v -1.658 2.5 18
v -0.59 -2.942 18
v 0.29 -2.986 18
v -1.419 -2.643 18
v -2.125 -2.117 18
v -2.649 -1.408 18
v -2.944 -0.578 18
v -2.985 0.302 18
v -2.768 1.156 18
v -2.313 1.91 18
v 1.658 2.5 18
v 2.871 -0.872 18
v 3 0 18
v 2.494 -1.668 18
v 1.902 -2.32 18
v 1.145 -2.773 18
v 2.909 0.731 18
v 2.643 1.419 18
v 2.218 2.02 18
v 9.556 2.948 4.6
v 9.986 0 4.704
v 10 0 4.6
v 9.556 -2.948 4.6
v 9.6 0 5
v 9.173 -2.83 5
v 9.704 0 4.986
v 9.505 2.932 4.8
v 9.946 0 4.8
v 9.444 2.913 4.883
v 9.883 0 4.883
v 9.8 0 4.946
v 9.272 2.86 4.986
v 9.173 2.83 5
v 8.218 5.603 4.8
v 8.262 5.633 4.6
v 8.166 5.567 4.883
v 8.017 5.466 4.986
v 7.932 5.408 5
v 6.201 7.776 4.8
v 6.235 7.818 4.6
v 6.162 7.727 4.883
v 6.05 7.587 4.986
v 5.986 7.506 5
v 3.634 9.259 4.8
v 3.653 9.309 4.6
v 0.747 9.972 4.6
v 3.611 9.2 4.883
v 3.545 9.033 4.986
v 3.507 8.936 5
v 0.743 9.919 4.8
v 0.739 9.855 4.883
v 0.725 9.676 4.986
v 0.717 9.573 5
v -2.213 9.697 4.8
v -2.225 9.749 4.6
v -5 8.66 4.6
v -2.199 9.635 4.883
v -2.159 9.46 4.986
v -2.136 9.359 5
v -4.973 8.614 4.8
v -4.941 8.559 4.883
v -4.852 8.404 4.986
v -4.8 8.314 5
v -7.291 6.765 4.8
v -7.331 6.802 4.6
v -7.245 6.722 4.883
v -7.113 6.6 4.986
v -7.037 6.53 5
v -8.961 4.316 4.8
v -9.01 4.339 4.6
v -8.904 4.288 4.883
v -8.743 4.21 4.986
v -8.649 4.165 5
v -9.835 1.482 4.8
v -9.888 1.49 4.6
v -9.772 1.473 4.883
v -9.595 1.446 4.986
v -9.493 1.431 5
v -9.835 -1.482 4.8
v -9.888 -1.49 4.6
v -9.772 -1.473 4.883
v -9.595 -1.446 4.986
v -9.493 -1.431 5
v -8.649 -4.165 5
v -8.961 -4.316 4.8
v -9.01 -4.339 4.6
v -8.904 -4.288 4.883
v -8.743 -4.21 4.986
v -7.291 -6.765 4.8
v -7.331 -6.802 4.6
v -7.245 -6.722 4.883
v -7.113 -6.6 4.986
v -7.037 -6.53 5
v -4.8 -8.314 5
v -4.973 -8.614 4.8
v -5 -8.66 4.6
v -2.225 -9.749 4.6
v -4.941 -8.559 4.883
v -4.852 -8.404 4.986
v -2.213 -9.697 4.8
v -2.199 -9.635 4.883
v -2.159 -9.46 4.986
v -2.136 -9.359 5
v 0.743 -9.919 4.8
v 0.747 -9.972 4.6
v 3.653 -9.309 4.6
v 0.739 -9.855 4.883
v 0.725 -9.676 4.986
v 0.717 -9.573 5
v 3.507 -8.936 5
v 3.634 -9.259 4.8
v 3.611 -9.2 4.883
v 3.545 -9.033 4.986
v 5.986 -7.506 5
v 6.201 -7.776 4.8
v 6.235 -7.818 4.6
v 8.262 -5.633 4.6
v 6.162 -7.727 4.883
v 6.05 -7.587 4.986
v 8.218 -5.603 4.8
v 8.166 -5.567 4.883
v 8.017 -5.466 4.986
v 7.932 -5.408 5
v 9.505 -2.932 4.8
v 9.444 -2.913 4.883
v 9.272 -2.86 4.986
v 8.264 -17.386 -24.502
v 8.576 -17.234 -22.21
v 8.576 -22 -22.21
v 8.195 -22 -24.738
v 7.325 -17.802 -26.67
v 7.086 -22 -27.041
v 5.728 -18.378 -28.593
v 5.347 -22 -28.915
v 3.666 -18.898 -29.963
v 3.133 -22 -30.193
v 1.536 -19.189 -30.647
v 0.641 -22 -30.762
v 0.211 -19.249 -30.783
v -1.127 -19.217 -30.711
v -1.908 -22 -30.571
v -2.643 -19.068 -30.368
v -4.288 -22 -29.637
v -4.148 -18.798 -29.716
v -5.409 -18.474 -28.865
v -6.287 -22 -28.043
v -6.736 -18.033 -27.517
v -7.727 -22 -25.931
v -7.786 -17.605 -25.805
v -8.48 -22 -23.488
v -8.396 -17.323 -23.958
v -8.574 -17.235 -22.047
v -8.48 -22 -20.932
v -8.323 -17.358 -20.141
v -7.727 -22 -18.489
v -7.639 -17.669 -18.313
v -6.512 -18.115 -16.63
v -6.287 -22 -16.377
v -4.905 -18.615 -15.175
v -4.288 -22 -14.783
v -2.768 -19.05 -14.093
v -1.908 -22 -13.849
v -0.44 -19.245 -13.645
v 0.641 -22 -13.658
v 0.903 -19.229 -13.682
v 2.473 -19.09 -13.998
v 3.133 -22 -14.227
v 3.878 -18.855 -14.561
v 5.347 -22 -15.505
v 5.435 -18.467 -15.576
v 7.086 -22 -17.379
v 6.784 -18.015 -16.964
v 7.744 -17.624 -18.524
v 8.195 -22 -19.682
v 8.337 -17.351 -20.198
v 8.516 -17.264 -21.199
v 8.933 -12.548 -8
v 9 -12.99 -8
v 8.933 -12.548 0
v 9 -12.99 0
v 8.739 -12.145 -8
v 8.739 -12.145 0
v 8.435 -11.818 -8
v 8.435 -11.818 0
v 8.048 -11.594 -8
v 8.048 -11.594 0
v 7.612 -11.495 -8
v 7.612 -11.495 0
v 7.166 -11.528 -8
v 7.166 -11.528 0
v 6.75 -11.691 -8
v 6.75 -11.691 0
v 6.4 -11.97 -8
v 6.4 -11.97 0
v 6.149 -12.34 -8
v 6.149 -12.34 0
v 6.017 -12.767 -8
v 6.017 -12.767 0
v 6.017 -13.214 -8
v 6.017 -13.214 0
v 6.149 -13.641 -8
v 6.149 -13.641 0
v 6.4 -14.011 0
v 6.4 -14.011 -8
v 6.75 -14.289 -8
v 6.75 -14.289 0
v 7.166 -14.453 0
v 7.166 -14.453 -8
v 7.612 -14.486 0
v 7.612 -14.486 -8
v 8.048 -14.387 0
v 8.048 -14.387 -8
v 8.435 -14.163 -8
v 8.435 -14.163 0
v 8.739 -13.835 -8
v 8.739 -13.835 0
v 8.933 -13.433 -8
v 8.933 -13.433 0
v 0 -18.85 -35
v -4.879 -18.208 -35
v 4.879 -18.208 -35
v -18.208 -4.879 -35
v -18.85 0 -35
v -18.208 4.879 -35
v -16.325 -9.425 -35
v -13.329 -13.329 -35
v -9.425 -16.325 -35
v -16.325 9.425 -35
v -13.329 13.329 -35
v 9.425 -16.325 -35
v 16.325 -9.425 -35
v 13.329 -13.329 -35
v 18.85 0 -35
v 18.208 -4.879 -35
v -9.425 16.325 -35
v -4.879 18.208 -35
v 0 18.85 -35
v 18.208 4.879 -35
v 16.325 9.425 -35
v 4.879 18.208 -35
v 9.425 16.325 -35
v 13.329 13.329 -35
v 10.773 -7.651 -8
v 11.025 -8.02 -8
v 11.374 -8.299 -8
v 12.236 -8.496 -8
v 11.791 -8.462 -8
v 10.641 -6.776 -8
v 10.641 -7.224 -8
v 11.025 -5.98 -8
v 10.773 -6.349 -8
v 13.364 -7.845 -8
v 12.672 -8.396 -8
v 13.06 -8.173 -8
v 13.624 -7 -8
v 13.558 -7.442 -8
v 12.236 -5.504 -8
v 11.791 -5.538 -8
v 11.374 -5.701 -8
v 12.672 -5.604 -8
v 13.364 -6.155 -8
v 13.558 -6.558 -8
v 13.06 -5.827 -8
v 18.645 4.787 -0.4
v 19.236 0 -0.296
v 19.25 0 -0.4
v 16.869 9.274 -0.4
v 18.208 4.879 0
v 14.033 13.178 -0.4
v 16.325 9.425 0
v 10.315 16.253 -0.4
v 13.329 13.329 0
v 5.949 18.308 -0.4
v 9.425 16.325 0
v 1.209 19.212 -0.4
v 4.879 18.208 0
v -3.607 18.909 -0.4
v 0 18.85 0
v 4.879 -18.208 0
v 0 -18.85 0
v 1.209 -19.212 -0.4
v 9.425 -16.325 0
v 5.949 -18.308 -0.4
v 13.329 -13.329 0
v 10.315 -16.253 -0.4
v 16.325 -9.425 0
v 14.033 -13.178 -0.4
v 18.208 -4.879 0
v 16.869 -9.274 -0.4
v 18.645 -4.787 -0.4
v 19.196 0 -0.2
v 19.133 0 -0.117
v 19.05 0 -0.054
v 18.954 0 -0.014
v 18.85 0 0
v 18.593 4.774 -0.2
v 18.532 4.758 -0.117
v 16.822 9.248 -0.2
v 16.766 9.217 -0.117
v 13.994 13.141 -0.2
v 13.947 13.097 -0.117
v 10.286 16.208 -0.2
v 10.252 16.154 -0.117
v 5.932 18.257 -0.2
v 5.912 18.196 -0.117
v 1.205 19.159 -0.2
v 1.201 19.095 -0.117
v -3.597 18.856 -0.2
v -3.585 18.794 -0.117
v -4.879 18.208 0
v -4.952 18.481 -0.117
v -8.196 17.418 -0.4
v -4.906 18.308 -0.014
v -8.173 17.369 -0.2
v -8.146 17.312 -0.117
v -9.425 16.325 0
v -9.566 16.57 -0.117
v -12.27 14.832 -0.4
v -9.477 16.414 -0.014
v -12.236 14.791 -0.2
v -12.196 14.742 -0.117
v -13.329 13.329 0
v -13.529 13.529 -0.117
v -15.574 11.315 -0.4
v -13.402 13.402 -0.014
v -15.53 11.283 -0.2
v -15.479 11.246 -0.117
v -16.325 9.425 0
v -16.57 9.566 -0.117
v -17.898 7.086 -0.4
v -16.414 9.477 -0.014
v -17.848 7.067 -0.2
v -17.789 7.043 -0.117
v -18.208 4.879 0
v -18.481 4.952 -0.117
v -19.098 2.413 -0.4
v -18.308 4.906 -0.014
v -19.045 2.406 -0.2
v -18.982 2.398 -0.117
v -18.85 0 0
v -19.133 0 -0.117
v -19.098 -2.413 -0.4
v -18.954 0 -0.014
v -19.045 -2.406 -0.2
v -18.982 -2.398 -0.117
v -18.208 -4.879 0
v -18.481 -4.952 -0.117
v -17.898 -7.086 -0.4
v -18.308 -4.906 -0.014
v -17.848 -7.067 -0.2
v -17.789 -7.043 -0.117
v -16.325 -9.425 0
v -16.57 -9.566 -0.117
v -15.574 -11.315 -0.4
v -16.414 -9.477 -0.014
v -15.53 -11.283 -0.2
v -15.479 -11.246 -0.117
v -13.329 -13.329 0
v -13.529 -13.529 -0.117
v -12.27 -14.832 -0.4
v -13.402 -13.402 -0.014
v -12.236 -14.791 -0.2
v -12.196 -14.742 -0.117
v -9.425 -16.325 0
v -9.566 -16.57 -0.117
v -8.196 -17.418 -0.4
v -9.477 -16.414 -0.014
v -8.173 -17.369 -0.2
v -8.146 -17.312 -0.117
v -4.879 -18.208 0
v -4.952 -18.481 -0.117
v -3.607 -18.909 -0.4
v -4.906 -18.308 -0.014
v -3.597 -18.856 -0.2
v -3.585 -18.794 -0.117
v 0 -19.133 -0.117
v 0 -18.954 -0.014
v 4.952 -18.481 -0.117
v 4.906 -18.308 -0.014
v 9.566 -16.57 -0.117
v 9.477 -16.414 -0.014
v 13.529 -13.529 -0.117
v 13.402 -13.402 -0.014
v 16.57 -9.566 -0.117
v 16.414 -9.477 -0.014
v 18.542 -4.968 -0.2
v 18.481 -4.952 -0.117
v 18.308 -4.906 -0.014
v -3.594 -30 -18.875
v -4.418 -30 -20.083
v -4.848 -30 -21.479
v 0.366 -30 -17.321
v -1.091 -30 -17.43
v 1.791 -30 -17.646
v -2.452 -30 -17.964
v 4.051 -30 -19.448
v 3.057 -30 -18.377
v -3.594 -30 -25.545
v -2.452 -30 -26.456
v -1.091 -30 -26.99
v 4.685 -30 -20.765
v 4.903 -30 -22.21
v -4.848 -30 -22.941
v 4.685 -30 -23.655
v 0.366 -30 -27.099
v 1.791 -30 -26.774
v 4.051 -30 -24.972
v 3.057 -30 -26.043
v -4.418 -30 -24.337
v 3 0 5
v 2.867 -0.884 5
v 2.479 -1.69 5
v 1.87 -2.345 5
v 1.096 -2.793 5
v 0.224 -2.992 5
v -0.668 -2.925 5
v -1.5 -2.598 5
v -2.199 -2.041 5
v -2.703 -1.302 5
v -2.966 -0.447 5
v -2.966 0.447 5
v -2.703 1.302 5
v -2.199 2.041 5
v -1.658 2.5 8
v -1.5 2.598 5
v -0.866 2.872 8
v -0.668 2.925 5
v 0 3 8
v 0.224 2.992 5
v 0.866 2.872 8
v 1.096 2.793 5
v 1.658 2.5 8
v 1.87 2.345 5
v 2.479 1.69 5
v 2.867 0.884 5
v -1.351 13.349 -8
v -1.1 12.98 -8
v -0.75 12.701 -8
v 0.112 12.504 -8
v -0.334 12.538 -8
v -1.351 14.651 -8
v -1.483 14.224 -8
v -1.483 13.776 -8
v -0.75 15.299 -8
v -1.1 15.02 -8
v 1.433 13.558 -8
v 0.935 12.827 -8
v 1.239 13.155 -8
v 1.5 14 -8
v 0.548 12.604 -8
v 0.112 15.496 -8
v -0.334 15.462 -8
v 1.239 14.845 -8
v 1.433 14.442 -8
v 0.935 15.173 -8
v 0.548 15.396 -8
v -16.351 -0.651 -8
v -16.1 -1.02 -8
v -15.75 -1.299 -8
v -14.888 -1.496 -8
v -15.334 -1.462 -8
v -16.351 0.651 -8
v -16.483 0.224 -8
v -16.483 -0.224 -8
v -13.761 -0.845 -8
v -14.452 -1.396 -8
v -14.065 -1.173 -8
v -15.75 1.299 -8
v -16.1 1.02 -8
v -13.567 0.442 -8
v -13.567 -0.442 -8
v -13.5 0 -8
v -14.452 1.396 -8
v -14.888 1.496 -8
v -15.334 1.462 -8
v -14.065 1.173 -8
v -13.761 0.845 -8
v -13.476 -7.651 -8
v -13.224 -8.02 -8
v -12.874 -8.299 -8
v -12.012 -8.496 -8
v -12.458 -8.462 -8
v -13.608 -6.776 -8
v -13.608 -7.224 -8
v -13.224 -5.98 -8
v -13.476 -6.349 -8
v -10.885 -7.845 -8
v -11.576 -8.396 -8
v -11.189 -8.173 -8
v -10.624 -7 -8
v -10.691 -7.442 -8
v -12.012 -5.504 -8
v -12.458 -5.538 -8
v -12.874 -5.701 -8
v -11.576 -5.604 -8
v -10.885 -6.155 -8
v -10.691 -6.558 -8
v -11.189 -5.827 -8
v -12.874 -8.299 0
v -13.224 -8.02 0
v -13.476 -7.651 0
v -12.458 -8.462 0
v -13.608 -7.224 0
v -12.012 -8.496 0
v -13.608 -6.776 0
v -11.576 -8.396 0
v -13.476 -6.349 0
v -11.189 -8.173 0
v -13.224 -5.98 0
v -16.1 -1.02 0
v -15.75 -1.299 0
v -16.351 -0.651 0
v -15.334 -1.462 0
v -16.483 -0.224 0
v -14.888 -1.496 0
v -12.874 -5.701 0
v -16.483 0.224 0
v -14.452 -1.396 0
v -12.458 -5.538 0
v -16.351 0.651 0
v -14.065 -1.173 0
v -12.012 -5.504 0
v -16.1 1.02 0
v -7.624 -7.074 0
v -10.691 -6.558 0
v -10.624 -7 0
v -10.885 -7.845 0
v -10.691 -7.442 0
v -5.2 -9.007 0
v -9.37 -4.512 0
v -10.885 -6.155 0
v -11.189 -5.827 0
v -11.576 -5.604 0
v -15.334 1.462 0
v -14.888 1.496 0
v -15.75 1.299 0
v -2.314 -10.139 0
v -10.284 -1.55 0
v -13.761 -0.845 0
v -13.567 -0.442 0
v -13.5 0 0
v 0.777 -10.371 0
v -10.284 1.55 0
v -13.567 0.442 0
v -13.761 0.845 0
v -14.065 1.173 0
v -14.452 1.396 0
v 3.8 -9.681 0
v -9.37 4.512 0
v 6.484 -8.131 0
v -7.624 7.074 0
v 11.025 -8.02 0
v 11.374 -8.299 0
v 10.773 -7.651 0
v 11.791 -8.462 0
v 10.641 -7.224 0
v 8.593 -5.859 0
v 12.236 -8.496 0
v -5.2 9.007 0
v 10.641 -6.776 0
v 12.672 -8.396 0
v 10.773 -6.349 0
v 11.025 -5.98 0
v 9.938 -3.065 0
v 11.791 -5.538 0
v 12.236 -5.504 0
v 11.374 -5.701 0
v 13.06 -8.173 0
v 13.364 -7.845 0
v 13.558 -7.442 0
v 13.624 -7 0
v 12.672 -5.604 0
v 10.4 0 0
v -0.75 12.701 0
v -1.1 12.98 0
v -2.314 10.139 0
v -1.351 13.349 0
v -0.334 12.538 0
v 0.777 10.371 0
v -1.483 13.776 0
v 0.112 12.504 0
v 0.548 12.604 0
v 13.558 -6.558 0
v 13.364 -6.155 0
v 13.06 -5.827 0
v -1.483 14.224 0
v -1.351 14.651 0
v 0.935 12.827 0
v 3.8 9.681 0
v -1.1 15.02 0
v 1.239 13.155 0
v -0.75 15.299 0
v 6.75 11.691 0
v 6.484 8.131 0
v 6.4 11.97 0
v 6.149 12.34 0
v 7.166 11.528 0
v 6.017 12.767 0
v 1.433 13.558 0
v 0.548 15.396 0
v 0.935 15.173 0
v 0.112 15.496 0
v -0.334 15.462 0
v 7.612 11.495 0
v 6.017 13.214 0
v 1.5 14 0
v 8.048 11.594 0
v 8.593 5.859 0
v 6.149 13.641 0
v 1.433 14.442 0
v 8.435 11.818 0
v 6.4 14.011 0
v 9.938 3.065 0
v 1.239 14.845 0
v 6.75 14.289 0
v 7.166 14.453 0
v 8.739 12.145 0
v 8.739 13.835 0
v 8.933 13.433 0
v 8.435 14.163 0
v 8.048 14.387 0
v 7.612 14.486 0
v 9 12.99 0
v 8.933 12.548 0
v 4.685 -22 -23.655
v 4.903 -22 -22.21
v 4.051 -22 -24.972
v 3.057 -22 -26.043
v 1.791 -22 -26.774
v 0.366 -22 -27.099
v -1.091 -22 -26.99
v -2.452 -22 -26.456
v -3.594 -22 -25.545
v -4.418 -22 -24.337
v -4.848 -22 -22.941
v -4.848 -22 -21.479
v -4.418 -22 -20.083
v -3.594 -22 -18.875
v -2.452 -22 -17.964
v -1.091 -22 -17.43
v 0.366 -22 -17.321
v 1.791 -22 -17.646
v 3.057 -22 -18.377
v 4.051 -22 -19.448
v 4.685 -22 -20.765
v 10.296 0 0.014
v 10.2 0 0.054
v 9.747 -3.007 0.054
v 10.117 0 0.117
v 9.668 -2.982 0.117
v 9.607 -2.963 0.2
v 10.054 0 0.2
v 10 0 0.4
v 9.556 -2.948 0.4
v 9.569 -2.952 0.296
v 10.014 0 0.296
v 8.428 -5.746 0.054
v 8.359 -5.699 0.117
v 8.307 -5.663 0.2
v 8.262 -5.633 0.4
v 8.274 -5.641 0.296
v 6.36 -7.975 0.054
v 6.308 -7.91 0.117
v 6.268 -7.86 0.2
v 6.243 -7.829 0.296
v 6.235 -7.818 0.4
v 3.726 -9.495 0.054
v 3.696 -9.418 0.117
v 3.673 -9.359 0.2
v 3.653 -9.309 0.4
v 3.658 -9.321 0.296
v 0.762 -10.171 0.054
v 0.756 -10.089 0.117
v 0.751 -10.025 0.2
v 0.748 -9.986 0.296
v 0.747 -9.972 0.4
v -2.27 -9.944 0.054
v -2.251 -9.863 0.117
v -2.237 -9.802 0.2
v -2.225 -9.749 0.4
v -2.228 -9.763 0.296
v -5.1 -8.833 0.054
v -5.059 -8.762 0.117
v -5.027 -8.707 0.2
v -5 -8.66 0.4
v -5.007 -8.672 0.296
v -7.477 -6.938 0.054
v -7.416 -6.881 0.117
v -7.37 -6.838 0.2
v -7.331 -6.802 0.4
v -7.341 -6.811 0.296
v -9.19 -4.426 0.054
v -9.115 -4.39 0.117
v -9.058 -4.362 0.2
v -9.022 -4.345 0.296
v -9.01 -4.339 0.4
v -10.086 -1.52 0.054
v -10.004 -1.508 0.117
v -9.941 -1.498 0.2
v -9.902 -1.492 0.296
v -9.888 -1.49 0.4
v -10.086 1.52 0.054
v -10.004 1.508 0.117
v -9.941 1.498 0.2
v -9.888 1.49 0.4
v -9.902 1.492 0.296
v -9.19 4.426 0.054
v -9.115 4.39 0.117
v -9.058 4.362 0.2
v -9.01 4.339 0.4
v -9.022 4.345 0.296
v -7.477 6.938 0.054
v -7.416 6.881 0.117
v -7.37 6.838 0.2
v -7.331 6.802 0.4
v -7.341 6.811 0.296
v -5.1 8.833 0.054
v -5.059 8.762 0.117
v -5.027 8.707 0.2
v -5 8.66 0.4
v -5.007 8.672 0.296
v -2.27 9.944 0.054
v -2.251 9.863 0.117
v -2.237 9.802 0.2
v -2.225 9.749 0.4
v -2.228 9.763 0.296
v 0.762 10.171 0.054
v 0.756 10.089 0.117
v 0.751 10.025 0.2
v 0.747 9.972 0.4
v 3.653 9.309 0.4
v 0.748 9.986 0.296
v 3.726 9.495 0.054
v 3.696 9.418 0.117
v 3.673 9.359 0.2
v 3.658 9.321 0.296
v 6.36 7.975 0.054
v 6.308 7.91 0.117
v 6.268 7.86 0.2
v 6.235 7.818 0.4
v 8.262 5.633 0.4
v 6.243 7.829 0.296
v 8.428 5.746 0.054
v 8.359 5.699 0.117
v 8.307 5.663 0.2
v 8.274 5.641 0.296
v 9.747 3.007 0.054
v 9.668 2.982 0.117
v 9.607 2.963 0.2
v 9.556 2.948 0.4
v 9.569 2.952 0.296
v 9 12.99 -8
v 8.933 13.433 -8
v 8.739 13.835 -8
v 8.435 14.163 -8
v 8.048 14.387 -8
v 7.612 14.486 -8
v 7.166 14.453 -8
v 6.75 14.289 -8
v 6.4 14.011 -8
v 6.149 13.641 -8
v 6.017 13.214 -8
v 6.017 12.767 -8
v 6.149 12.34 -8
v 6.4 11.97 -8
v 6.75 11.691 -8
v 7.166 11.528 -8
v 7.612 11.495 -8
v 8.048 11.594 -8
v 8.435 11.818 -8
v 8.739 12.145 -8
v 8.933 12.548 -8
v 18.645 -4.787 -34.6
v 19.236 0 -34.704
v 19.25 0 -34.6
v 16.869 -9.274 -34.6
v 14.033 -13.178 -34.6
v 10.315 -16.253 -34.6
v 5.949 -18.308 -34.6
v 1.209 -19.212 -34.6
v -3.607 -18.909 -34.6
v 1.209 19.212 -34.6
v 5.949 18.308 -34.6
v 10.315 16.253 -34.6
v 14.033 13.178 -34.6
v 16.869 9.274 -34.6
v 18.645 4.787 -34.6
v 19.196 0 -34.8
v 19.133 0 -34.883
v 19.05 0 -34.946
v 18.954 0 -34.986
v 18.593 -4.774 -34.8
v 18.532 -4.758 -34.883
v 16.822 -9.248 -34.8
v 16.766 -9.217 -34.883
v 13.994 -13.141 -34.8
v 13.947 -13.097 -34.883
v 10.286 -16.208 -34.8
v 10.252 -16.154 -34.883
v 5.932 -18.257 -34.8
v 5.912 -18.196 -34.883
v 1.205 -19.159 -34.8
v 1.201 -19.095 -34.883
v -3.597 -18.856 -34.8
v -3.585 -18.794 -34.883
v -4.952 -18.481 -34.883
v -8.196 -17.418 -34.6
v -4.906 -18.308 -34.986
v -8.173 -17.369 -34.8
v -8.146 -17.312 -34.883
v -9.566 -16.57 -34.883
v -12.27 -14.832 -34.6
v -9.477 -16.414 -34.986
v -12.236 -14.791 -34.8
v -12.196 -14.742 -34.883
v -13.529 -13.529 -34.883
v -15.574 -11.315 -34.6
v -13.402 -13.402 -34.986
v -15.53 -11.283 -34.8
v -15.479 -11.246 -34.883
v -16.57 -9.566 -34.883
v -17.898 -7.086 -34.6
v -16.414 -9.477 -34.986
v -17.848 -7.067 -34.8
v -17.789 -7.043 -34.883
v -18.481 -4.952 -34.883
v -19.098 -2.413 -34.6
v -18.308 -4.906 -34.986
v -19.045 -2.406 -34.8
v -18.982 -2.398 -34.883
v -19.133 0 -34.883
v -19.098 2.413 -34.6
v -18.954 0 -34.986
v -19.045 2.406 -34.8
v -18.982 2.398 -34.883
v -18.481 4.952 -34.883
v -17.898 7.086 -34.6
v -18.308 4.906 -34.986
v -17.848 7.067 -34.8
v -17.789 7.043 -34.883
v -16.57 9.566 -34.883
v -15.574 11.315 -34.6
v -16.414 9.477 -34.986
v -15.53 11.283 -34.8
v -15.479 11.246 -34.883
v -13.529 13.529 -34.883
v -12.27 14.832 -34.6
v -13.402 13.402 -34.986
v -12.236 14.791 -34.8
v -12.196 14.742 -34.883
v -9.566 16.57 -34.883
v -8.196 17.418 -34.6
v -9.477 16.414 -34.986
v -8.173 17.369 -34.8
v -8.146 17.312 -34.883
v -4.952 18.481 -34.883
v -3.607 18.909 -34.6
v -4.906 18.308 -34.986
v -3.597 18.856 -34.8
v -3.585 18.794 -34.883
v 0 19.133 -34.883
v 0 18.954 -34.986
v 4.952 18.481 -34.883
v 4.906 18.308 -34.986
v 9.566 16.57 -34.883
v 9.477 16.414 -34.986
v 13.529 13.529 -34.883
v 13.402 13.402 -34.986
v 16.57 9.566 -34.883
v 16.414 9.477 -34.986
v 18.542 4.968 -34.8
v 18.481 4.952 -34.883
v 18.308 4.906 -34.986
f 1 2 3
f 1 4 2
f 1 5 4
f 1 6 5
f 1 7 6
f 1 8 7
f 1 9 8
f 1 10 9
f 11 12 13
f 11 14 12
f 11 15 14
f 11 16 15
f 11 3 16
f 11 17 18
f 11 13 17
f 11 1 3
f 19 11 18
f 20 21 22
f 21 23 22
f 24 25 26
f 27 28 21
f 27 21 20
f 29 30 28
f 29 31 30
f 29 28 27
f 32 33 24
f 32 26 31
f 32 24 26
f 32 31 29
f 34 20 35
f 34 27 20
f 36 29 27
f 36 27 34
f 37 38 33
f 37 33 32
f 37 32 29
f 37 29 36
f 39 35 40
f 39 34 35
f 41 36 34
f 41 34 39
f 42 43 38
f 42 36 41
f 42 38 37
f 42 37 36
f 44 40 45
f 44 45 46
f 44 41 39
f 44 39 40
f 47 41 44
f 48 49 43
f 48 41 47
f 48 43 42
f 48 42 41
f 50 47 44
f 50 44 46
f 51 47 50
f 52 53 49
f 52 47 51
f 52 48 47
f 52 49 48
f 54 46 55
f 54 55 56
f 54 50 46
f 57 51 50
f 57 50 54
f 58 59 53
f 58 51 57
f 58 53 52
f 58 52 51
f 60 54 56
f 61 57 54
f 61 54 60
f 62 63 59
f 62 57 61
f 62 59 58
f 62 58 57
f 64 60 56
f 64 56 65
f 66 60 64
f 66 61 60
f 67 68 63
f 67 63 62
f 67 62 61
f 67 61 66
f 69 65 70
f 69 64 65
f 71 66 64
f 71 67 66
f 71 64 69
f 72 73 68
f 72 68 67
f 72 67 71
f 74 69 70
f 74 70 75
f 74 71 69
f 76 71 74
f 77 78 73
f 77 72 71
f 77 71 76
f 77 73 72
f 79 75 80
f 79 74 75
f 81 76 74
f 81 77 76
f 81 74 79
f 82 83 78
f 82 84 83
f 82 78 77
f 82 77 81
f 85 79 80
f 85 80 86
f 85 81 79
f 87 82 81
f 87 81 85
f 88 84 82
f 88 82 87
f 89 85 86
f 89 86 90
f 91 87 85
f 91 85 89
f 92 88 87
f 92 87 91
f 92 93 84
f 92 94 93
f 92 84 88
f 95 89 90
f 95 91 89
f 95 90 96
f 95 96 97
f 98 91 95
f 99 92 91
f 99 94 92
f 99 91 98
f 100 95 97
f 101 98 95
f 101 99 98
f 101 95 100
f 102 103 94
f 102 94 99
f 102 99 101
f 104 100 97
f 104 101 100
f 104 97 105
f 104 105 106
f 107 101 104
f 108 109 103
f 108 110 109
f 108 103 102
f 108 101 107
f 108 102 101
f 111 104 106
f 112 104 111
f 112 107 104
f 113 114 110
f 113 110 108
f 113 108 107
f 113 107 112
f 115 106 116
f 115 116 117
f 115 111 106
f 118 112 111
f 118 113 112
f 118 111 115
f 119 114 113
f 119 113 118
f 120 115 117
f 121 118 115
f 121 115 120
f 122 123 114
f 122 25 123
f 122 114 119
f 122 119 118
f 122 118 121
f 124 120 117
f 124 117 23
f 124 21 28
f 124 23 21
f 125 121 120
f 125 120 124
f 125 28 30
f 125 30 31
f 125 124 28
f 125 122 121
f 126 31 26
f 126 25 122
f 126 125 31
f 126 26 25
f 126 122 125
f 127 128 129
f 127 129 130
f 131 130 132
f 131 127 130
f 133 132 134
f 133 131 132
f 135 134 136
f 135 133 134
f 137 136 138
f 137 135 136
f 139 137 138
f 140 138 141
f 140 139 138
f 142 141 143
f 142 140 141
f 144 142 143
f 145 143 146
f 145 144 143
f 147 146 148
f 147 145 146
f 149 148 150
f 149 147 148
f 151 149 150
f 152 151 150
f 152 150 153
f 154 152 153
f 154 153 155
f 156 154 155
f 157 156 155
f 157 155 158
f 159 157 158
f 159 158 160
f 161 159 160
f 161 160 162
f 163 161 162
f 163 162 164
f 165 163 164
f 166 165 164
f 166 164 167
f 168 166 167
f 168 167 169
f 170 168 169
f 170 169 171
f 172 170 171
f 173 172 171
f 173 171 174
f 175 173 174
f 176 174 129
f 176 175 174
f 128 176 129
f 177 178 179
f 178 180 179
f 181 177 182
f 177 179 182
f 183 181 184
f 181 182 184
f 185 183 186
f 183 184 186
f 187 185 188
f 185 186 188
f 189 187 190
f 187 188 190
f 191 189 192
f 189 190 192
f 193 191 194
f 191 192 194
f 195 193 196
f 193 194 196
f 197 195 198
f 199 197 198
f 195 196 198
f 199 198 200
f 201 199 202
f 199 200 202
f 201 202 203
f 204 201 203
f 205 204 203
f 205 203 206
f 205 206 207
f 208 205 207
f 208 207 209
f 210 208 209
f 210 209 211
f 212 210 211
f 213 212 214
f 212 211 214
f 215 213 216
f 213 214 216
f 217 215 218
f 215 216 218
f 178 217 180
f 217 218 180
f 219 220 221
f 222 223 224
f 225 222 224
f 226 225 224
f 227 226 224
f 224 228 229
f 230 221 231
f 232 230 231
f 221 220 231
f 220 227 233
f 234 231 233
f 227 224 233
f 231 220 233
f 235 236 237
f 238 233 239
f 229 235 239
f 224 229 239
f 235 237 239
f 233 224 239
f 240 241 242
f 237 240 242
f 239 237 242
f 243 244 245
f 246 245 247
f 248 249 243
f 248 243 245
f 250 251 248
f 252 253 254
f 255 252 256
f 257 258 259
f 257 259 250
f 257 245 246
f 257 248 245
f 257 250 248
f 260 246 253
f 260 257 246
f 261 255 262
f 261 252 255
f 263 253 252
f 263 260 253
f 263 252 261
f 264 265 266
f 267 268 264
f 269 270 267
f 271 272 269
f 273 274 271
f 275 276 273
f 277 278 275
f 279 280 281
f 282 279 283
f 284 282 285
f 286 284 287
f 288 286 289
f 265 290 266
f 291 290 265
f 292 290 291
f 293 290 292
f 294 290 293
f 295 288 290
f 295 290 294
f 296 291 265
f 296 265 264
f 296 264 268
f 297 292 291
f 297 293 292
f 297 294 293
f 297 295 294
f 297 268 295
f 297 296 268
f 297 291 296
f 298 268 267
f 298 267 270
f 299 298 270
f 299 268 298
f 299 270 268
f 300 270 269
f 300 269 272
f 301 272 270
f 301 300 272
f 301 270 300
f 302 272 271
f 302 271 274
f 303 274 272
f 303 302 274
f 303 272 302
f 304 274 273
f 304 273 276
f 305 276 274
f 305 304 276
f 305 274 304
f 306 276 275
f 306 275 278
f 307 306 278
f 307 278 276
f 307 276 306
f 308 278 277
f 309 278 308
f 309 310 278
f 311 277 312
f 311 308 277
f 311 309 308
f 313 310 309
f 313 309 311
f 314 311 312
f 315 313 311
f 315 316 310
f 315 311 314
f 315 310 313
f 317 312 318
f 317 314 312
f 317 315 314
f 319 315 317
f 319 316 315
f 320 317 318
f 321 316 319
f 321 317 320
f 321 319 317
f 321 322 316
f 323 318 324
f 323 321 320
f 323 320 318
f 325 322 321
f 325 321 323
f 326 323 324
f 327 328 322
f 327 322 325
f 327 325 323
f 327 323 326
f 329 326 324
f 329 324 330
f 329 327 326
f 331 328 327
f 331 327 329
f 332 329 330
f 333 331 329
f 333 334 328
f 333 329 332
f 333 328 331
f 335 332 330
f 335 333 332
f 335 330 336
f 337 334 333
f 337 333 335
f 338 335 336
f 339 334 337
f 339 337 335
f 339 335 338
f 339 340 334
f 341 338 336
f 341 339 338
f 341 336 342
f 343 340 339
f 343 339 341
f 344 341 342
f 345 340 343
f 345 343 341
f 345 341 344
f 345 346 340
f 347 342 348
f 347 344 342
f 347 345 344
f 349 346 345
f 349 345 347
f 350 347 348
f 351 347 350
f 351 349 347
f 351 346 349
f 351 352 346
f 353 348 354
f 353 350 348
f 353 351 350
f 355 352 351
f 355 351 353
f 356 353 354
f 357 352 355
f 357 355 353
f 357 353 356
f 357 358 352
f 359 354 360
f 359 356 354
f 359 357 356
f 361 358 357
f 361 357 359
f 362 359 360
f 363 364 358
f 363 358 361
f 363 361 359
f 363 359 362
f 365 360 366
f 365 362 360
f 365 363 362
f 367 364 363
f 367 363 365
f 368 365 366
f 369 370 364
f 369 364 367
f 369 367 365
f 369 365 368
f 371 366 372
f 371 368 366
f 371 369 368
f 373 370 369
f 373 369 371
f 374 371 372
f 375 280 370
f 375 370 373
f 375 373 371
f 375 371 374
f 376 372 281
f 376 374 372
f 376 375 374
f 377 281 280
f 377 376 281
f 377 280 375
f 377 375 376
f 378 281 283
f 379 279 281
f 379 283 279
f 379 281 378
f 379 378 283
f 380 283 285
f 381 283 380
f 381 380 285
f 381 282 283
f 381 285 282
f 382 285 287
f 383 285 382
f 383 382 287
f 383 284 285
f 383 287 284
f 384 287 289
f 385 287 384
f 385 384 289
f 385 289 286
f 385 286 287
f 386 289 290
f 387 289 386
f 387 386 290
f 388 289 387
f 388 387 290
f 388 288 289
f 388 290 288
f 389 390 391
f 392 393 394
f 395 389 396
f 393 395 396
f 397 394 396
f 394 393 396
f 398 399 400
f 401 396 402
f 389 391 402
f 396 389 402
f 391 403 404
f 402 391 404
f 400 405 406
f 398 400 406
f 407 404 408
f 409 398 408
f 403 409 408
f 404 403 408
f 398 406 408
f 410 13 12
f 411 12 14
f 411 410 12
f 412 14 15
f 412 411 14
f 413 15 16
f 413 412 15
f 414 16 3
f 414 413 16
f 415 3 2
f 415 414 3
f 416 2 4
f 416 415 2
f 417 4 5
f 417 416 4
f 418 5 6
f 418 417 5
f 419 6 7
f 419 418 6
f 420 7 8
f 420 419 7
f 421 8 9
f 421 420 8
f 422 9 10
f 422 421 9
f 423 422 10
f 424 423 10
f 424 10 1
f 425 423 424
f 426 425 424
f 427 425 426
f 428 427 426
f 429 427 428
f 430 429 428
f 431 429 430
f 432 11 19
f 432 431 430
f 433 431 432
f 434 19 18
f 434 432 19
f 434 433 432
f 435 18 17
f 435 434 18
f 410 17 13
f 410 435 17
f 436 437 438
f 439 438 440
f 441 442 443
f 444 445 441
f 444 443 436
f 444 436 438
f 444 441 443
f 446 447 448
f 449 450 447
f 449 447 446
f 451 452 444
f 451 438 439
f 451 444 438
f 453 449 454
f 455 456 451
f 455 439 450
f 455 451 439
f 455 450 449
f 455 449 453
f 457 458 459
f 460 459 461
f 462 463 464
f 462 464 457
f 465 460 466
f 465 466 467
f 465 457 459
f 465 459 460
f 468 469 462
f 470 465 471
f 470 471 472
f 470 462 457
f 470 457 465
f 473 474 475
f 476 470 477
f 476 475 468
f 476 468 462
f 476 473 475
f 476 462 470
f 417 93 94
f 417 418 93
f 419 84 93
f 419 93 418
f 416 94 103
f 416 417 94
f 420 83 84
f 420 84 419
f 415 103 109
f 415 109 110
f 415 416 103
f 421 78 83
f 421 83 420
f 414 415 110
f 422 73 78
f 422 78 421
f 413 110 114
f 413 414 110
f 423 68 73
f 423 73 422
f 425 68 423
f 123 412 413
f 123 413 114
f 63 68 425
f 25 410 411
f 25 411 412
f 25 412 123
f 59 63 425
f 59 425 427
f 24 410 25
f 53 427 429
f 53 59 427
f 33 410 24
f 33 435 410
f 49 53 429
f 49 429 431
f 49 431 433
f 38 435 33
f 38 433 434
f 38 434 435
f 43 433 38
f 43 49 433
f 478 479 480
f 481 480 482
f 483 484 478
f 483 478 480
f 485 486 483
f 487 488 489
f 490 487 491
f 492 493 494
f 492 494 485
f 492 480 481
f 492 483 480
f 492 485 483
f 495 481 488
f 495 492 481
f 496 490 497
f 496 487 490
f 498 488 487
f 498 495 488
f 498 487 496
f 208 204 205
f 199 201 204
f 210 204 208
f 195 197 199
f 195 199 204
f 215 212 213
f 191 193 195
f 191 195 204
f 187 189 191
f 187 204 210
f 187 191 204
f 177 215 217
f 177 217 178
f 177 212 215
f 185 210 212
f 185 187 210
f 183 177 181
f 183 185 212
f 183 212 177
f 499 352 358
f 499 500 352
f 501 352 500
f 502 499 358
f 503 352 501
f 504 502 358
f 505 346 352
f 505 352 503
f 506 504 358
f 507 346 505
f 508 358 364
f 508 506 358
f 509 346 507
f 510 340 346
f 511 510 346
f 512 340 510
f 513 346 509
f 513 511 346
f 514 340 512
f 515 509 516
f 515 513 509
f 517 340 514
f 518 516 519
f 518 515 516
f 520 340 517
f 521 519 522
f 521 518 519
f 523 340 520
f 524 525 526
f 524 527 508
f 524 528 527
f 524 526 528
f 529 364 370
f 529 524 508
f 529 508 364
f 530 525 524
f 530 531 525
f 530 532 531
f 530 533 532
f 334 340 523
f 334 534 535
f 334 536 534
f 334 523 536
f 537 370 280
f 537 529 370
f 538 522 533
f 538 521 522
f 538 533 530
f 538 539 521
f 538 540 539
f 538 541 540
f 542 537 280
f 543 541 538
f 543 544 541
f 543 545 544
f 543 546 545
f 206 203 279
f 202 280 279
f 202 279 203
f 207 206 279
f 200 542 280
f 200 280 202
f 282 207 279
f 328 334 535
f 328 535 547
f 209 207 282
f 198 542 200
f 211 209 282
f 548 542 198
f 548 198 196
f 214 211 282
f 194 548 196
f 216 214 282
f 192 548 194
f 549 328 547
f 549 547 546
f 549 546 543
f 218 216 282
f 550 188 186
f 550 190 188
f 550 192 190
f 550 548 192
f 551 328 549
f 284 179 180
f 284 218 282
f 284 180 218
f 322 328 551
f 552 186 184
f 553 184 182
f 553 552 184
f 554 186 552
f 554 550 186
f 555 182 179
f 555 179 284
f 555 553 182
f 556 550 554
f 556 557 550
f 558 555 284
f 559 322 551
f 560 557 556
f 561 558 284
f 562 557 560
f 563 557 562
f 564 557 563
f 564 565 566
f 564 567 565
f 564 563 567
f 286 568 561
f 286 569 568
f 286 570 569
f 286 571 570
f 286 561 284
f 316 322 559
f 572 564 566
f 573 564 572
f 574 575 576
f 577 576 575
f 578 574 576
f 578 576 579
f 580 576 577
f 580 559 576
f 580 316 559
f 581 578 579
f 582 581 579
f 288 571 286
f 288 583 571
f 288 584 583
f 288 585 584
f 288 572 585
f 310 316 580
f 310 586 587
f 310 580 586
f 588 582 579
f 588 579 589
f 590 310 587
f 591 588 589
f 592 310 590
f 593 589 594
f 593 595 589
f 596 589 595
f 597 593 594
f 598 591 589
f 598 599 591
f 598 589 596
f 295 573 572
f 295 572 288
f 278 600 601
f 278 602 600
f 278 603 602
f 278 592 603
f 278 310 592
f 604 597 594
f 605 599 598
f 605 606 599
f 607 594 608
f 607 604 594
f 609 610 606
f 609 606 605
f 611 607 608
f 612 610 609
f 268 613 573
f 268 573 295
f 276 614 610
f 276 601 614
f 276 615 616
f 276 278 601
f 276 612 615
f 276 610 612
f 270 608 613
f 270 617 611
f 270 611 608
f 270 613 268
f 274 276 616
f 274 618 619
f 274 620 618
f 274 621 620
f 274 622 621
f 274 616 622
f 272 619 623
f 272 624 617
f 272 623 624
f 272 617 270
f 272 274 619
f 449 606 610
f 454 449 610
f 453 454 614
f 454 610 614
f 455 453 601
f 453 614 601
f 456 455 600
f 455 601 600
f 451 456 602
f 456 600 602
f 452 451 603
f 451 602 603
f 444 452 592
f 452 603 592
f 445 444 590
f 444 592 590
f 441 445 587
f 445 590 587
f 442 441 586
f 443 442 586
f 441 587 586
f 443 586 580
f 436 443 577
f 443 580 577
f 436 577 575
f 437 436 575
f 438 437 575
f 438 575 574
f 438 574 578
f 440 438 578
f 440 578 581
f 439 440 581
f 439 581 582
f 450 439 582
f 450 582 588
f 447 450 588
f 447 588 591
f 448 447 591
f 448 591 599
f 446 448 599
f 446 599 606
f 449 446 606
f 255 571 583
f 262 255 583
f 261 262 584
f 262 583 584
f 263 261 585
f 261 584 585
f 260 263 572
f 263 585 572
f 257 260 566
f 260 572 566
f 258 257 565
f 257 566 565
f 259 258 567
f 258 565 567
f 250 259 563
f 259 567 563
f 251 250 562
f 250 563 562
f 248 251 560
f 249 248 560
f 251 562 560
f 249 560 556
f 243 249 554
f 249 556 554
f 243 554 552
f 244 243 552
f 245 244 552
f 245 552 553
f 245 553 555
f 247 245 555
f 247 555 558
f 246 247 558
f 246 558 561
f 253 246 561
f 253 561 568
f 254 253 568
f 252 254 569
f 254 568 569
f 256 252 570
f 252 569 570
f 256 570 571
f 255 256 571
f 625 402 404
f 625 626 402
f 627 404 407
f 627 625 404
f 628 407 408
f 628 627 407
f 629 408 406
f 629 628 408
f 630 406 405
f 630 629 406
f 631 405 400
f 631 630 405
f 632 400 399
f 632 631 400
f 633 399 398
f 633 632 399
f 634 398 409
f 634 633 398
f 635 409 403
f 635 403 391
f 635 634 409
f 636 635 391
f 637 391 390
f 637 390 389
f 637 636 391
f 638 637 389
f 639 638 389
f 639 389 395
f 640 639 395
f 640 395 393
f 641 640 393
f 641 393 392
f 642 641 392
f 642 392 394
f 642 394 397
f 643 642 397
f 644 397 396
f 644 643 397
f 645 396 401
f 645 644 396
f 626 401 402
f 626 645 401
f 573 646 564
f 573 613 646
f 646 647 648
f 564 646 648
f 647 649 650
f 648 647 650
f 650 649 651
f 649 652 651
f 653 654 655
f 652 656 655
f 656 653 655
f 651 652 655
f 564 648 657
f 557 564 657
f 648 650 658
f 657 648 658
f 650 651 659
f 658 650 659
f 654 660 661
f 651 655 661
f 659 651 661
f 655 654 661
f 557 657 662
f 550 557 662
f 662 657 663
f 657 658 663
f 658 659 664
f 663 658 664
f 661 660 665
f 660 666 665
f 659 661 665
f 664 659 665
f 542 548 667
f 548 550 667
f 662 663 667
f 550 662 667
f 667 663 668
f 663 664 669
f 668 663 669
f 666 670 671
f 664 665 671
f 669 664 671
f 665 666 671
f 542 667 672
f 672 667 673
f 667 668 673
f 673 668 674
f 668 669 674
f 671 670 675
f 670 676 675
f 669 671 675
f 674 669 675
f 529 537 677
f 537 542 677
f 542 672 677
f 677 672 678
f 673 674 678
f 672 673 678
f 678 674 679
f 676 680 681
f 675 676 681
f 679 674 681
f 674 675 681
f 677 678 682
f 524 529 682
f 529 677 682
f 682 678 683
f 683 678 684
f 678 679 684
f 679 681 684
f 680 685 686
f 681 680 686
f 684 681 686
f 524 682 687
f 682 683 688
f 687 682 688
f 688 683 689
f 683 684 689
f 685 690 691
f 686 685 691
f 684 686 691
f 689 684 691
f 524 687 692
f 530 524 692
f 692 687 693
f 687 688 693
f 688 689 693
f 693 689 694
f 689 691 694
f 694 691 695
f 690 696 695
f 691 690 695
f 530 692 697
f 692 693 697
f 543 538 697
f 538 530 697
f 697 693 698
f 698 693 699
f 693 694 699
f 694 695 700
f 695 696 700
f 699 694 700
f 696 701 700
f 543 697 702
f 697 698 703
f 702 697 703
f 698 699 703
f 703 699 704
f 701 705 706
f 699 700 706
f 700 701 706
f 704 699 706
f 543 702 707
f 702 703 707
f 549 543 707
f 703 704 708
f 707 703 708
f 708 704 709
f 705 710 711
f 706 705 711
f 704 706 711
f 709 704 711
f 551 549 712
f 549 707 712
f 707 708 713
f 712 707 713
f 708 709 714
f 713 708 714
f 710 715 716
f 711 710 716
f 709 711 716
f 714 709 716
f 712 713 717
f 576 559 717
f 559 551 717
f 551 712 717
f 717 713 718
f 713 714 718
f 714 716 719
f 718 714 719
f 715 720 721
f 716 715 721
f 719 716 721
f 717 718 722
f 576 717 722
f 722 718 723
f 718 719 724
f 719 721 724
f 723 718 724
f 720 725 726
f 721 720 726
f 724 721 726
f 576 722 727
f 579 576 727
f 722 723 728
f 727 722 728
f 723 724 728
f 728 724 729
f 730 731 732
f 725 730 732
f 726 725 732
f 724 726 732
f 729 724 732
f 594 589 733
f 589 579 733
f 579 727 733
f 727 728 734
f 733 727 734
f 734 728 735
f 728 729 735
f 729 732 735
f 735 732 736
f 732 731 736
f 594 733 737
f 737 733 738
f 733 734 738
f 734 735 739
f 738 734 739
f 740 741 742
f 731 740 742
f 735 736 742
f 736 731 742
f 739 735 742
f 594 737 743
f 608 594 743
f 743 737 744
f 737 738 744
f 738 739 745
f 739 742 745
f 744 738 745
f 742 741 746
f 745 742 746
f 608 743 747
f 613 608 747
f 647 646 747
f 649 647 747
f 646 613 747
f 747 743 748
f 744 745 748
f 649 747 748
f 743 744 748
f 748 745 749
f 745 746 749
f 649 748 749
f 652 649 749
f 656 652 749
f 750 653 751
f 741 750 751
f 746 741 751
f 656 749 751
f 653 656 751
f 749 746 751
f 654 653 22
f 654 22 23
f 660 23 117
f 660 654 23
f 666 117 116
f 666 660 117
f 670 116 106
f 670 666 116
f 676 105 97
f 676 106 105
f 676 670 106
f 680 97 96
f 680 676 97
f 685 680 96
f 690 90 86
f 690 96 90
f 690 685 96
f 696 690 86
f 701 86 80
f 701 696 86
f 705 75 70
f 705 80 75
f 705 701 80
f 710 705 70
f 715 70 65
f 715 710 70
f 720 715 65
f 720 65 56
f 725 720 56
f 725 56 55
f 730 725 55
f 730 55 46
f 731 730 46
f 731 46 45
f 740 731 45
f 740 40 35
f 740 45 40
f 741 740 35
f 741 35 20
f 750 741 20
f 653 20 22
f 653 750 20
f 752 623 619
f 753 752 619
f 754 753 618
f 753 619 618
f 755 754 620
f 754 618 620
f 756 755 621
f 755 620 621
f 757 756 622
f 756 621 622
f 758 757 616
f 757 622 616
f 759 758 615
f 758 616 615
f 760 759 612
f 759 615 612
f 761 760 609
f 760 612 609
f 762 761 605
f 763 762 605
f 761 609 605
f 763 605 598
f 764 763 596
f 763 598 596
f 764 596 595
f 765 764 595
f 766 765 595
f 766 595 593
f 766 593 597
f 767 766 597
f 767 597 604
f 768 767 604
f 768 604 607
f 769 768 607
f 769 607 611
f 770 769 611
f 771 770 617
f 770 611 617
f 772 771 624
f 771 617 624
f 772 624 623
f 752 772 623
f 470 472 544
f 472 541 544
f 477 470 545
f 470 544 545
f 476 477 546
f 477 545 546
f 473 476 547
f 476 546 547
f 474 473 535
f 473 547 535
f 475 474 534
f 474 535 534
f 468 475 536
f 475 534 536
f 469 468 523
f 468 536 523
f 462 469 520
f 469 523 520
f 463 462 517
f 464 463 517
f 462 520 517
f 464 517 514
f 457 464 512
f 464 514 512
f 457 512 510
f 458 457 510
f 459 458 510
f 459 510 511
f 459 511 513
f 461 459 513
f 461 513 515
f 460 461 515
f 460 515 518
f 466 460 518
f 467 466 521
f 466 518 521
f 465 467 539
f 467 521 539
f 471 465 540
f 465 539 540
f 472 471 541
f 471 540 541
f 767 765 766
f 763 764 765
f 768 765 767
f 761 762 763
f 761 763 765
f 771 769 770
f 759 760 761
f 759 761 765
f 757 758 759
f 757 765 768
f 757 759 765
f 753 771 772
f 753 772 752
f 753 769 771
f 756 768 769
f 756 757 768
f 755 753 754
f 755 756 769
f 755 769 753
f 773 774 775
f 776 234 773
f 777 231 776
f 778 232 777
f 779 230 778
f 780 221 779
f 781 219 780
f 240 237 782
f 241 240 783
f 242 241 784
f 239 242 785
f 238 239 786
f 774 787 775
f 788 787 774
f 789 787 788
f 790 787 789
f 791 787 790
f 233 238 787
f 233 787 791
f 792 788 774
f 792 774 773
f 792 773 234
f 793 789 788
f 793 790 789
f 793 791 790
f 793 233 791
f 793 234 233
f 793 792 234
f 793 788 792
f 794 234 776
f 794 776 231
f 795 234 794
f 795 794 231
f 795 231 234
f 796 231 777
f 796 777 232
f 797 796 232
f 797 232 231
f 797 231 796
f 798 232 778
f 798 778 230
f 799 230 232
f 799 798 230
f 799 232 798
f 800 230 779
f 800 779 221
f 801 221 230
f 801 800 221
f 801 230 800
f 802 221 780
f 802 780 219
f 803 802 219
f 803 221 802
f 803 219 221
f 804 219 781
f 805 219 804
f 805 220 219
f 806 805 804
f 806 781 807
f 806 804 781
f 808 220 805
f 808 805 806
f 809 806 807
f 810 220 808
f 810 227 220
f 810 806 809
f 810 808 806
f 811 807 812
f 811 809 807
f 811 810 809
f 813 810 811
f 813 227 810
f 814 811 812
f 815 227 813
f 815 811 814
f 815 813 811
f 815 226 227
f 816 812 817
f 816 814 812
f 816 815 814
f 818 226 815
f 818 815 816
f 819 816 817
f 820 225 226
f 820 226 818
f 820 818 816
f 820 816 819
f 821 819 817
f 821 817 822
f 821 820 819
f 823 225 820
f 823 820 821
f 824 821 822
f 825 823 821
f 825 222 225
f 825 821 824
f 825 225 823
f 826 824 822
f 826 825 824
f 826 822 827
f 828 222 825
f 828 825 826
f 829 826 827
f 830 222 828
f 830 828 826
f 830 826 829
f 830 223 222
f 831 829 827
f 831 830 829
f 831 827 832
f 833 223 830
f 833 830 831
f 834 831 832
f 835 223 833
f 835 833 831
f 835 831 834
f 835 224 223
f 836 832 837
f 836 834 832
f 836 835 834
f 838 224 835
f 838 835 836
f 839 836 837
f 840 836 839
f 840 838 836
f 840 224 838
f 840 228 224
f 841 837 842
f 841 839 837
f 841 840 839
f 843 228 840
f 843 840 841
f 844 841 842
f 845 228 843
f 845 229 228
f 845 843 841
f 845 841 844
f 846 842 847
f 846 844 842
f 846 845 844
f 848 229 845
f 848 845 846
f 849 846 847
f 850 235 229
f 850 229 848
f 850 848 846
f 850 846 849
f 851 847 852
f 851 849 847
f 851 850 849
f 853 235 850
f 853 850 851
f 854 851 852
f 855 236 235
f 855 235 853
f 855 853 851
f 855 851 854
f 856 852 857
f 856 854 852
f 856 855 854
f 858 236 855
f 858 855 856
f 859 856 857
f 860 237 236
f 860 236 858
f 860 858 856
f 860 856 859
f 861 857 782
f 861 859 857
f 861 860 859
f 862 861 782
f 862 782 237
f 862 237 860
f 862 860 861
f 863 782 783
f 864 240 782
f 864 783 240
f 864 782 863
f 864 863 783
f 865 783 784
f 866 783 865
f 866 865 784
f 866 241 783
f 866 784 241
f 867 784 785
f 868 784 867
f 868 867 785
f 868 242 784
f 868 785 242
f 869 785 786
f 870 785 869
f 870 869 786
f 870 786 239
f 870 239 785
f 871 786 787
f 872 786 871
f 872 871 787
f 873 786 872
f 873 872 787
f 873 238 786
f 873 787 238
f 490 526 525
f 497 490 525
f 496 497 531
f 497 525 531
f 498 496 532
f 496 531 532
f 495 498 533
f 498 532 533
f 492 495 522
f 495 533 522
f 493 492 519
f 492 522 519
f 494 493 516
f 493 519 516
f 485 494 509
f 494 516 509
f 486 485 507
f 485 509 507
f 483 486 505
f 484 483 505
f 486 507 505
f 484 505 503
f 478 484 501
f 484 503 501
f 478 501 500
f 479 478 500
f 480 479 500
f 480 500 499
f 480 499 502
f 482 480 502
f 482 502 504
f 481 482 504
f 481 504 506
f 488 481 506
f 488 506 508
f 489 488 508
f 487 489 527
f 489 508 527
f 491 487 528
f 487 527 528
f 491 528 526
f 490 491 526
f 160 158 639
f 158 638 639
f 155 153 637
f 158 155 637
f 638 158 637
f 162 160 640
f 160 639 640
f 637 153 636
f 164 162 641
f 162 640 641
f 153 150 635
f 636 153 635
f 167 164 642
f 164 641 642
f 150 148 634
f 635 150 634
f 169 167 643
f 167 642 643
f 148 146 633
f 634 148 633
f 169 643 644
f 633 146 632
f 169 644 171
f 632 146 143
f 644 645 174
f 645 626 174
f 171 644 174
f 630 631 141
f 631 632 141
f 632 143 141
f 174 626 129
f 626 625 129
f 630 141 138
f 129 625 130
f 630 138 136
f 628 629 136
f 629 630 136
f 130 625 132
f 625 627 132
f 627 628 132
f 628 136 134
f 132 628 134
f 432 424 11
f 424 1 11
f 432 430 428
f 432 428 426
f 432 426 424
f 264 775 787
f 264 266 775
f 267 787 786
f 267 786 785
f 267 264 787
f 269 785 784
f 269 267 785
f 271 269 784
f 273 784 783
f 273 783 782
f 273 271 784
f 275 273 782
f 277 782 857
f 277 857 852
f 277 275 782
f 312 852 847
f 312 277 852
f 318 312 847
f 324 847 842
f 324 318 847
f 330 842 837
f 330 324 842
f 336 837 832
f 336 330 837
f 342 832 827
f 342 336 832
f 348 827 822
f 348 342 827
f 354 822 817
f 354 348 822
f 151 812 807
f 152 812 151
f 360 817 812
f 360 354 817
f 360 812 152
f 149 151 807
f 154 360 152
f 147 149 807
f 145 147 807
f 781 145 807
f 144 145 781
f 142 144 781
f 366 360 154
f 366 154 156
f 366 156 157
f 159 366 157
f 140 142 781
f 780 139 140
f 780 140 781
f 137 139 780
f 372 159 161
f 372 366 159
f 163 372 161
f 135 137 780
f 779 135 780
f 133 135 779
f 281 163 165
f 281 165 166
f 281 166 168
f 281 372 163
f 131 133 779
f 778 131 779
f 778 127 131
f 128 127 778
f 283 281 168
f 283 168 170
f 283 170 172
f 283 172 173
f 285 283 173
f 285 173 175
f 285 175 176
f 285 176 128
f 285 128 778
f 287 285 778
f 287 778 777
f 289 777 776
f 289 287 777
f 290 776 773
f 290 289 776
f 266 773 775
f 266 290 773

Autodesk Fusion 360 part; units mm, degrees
sketch "Sketch2" plane through (0, 0, 0) normal (0, 0, 1) x (1, 0, 0)
  circle A0 centre (0, 0) radius 19.25
  circle A1 centre (0, 0) radius 10
  circle A2 centre (0, 0) radius 3
  circle A3 centre (0, 0) radius 14 construction
  circle A4 centre (0, 0) radius 15 construction
  line L0 (0, 0) -> (0, 19.25) construction
  circle A5 centre (0, 14) radius 1.5
  circle A6 centre (-12.1244, -7) radius 1.5
  circle A7 centre (12.1244, -7) radius 1.5
  line L1 (0, 0) -> (16.3101, 28.25) construction
  line L2 (0, 0) -> (32.8938, 0) construction
  circle A8 centre (7.5, 12.9904) radius 1.5
  circle A9 centre (-15, 0) radius 1.5
  circle A10 centre (7.5, -12.9904) radius 1.5
  line L3 (-1.6583, 2.5) -> (1.6583, 2.5)
  line L4 (0, 0) -> (0, -32) construction
  line L5 (0, 2.5) -> (0, -3) construction
  dimension "d1" = 38.5
  dimension "d2" = 20
  dimension "d3" = 6
  dimension "d4" = 28
  dimension "d5" = 30
  dimension "d6" = 3
  dimension "d8" = 360
  dimension "d9" = 60
  dimension "d10" = 3
  dimension "d12" = 360
  dimension "d29" = 5.5
extrude "Extrude1" add sketch "Sketch2" against normal blind 35 contours A0 | A1 | A2 L3 | A2 L3 | A5 | A6 | A7 | A8 | A9 | A10
extrude "Extrude2" cut sketch "Sketch2" against normal blind 8 contours A5 | A6 | A7 | A8 | A9 | A10
extrude "Extrude3" add sketch "Sketch2" along normal blind 5 contours A1 | A2 L3 | A2 L3
extrude "Extrude4" add sketch "Sketch2" along normal blind 18 contours A2 L3 | A2 L3
sketch "Sketch4" plane through (0, 0, 18) normal (0, 0, 1) x (1, 0, 0)
  circle A0 centre (0, 0) radius 3
  line L0 (-1.6583, 2.5) -> (1.6583, 2.5)
  circle A1 centre (0, 0) radius 3
extrude "Extrude5" cut sketch "Sketch4" against normal blind 10 contours A0 L0 A1 picked at (0.41, 2.7801)
fillet "Fillet1" radius 0.4 4 edges at (-9.3233, -3.6162, 5) (-17.9473, -6.9611, 0) (-17.9473, 6.9611, -35) (-9.3233, 3.6162, 0)
sketch "Sketch6" plane through (0, 0, 0) normal (0, 1, 0) x (1, 0, 0)
  line L0 (19.25, 34.6) -> (-19.25, 34.6)
  line L1 (0, 0) -> (0, 44.4198) construction
  circle A0 centre (0, 22.2099) radius 8.5759
  circle A1 centre (0, 22.2099) radius 4.9031
extrude "Extrude6" add sketch "Sketch6" against normal blind 22 contours A0 | A1
extrude "Extrude7" add sketch "Sketch6" against normal blind 30 contours A1
